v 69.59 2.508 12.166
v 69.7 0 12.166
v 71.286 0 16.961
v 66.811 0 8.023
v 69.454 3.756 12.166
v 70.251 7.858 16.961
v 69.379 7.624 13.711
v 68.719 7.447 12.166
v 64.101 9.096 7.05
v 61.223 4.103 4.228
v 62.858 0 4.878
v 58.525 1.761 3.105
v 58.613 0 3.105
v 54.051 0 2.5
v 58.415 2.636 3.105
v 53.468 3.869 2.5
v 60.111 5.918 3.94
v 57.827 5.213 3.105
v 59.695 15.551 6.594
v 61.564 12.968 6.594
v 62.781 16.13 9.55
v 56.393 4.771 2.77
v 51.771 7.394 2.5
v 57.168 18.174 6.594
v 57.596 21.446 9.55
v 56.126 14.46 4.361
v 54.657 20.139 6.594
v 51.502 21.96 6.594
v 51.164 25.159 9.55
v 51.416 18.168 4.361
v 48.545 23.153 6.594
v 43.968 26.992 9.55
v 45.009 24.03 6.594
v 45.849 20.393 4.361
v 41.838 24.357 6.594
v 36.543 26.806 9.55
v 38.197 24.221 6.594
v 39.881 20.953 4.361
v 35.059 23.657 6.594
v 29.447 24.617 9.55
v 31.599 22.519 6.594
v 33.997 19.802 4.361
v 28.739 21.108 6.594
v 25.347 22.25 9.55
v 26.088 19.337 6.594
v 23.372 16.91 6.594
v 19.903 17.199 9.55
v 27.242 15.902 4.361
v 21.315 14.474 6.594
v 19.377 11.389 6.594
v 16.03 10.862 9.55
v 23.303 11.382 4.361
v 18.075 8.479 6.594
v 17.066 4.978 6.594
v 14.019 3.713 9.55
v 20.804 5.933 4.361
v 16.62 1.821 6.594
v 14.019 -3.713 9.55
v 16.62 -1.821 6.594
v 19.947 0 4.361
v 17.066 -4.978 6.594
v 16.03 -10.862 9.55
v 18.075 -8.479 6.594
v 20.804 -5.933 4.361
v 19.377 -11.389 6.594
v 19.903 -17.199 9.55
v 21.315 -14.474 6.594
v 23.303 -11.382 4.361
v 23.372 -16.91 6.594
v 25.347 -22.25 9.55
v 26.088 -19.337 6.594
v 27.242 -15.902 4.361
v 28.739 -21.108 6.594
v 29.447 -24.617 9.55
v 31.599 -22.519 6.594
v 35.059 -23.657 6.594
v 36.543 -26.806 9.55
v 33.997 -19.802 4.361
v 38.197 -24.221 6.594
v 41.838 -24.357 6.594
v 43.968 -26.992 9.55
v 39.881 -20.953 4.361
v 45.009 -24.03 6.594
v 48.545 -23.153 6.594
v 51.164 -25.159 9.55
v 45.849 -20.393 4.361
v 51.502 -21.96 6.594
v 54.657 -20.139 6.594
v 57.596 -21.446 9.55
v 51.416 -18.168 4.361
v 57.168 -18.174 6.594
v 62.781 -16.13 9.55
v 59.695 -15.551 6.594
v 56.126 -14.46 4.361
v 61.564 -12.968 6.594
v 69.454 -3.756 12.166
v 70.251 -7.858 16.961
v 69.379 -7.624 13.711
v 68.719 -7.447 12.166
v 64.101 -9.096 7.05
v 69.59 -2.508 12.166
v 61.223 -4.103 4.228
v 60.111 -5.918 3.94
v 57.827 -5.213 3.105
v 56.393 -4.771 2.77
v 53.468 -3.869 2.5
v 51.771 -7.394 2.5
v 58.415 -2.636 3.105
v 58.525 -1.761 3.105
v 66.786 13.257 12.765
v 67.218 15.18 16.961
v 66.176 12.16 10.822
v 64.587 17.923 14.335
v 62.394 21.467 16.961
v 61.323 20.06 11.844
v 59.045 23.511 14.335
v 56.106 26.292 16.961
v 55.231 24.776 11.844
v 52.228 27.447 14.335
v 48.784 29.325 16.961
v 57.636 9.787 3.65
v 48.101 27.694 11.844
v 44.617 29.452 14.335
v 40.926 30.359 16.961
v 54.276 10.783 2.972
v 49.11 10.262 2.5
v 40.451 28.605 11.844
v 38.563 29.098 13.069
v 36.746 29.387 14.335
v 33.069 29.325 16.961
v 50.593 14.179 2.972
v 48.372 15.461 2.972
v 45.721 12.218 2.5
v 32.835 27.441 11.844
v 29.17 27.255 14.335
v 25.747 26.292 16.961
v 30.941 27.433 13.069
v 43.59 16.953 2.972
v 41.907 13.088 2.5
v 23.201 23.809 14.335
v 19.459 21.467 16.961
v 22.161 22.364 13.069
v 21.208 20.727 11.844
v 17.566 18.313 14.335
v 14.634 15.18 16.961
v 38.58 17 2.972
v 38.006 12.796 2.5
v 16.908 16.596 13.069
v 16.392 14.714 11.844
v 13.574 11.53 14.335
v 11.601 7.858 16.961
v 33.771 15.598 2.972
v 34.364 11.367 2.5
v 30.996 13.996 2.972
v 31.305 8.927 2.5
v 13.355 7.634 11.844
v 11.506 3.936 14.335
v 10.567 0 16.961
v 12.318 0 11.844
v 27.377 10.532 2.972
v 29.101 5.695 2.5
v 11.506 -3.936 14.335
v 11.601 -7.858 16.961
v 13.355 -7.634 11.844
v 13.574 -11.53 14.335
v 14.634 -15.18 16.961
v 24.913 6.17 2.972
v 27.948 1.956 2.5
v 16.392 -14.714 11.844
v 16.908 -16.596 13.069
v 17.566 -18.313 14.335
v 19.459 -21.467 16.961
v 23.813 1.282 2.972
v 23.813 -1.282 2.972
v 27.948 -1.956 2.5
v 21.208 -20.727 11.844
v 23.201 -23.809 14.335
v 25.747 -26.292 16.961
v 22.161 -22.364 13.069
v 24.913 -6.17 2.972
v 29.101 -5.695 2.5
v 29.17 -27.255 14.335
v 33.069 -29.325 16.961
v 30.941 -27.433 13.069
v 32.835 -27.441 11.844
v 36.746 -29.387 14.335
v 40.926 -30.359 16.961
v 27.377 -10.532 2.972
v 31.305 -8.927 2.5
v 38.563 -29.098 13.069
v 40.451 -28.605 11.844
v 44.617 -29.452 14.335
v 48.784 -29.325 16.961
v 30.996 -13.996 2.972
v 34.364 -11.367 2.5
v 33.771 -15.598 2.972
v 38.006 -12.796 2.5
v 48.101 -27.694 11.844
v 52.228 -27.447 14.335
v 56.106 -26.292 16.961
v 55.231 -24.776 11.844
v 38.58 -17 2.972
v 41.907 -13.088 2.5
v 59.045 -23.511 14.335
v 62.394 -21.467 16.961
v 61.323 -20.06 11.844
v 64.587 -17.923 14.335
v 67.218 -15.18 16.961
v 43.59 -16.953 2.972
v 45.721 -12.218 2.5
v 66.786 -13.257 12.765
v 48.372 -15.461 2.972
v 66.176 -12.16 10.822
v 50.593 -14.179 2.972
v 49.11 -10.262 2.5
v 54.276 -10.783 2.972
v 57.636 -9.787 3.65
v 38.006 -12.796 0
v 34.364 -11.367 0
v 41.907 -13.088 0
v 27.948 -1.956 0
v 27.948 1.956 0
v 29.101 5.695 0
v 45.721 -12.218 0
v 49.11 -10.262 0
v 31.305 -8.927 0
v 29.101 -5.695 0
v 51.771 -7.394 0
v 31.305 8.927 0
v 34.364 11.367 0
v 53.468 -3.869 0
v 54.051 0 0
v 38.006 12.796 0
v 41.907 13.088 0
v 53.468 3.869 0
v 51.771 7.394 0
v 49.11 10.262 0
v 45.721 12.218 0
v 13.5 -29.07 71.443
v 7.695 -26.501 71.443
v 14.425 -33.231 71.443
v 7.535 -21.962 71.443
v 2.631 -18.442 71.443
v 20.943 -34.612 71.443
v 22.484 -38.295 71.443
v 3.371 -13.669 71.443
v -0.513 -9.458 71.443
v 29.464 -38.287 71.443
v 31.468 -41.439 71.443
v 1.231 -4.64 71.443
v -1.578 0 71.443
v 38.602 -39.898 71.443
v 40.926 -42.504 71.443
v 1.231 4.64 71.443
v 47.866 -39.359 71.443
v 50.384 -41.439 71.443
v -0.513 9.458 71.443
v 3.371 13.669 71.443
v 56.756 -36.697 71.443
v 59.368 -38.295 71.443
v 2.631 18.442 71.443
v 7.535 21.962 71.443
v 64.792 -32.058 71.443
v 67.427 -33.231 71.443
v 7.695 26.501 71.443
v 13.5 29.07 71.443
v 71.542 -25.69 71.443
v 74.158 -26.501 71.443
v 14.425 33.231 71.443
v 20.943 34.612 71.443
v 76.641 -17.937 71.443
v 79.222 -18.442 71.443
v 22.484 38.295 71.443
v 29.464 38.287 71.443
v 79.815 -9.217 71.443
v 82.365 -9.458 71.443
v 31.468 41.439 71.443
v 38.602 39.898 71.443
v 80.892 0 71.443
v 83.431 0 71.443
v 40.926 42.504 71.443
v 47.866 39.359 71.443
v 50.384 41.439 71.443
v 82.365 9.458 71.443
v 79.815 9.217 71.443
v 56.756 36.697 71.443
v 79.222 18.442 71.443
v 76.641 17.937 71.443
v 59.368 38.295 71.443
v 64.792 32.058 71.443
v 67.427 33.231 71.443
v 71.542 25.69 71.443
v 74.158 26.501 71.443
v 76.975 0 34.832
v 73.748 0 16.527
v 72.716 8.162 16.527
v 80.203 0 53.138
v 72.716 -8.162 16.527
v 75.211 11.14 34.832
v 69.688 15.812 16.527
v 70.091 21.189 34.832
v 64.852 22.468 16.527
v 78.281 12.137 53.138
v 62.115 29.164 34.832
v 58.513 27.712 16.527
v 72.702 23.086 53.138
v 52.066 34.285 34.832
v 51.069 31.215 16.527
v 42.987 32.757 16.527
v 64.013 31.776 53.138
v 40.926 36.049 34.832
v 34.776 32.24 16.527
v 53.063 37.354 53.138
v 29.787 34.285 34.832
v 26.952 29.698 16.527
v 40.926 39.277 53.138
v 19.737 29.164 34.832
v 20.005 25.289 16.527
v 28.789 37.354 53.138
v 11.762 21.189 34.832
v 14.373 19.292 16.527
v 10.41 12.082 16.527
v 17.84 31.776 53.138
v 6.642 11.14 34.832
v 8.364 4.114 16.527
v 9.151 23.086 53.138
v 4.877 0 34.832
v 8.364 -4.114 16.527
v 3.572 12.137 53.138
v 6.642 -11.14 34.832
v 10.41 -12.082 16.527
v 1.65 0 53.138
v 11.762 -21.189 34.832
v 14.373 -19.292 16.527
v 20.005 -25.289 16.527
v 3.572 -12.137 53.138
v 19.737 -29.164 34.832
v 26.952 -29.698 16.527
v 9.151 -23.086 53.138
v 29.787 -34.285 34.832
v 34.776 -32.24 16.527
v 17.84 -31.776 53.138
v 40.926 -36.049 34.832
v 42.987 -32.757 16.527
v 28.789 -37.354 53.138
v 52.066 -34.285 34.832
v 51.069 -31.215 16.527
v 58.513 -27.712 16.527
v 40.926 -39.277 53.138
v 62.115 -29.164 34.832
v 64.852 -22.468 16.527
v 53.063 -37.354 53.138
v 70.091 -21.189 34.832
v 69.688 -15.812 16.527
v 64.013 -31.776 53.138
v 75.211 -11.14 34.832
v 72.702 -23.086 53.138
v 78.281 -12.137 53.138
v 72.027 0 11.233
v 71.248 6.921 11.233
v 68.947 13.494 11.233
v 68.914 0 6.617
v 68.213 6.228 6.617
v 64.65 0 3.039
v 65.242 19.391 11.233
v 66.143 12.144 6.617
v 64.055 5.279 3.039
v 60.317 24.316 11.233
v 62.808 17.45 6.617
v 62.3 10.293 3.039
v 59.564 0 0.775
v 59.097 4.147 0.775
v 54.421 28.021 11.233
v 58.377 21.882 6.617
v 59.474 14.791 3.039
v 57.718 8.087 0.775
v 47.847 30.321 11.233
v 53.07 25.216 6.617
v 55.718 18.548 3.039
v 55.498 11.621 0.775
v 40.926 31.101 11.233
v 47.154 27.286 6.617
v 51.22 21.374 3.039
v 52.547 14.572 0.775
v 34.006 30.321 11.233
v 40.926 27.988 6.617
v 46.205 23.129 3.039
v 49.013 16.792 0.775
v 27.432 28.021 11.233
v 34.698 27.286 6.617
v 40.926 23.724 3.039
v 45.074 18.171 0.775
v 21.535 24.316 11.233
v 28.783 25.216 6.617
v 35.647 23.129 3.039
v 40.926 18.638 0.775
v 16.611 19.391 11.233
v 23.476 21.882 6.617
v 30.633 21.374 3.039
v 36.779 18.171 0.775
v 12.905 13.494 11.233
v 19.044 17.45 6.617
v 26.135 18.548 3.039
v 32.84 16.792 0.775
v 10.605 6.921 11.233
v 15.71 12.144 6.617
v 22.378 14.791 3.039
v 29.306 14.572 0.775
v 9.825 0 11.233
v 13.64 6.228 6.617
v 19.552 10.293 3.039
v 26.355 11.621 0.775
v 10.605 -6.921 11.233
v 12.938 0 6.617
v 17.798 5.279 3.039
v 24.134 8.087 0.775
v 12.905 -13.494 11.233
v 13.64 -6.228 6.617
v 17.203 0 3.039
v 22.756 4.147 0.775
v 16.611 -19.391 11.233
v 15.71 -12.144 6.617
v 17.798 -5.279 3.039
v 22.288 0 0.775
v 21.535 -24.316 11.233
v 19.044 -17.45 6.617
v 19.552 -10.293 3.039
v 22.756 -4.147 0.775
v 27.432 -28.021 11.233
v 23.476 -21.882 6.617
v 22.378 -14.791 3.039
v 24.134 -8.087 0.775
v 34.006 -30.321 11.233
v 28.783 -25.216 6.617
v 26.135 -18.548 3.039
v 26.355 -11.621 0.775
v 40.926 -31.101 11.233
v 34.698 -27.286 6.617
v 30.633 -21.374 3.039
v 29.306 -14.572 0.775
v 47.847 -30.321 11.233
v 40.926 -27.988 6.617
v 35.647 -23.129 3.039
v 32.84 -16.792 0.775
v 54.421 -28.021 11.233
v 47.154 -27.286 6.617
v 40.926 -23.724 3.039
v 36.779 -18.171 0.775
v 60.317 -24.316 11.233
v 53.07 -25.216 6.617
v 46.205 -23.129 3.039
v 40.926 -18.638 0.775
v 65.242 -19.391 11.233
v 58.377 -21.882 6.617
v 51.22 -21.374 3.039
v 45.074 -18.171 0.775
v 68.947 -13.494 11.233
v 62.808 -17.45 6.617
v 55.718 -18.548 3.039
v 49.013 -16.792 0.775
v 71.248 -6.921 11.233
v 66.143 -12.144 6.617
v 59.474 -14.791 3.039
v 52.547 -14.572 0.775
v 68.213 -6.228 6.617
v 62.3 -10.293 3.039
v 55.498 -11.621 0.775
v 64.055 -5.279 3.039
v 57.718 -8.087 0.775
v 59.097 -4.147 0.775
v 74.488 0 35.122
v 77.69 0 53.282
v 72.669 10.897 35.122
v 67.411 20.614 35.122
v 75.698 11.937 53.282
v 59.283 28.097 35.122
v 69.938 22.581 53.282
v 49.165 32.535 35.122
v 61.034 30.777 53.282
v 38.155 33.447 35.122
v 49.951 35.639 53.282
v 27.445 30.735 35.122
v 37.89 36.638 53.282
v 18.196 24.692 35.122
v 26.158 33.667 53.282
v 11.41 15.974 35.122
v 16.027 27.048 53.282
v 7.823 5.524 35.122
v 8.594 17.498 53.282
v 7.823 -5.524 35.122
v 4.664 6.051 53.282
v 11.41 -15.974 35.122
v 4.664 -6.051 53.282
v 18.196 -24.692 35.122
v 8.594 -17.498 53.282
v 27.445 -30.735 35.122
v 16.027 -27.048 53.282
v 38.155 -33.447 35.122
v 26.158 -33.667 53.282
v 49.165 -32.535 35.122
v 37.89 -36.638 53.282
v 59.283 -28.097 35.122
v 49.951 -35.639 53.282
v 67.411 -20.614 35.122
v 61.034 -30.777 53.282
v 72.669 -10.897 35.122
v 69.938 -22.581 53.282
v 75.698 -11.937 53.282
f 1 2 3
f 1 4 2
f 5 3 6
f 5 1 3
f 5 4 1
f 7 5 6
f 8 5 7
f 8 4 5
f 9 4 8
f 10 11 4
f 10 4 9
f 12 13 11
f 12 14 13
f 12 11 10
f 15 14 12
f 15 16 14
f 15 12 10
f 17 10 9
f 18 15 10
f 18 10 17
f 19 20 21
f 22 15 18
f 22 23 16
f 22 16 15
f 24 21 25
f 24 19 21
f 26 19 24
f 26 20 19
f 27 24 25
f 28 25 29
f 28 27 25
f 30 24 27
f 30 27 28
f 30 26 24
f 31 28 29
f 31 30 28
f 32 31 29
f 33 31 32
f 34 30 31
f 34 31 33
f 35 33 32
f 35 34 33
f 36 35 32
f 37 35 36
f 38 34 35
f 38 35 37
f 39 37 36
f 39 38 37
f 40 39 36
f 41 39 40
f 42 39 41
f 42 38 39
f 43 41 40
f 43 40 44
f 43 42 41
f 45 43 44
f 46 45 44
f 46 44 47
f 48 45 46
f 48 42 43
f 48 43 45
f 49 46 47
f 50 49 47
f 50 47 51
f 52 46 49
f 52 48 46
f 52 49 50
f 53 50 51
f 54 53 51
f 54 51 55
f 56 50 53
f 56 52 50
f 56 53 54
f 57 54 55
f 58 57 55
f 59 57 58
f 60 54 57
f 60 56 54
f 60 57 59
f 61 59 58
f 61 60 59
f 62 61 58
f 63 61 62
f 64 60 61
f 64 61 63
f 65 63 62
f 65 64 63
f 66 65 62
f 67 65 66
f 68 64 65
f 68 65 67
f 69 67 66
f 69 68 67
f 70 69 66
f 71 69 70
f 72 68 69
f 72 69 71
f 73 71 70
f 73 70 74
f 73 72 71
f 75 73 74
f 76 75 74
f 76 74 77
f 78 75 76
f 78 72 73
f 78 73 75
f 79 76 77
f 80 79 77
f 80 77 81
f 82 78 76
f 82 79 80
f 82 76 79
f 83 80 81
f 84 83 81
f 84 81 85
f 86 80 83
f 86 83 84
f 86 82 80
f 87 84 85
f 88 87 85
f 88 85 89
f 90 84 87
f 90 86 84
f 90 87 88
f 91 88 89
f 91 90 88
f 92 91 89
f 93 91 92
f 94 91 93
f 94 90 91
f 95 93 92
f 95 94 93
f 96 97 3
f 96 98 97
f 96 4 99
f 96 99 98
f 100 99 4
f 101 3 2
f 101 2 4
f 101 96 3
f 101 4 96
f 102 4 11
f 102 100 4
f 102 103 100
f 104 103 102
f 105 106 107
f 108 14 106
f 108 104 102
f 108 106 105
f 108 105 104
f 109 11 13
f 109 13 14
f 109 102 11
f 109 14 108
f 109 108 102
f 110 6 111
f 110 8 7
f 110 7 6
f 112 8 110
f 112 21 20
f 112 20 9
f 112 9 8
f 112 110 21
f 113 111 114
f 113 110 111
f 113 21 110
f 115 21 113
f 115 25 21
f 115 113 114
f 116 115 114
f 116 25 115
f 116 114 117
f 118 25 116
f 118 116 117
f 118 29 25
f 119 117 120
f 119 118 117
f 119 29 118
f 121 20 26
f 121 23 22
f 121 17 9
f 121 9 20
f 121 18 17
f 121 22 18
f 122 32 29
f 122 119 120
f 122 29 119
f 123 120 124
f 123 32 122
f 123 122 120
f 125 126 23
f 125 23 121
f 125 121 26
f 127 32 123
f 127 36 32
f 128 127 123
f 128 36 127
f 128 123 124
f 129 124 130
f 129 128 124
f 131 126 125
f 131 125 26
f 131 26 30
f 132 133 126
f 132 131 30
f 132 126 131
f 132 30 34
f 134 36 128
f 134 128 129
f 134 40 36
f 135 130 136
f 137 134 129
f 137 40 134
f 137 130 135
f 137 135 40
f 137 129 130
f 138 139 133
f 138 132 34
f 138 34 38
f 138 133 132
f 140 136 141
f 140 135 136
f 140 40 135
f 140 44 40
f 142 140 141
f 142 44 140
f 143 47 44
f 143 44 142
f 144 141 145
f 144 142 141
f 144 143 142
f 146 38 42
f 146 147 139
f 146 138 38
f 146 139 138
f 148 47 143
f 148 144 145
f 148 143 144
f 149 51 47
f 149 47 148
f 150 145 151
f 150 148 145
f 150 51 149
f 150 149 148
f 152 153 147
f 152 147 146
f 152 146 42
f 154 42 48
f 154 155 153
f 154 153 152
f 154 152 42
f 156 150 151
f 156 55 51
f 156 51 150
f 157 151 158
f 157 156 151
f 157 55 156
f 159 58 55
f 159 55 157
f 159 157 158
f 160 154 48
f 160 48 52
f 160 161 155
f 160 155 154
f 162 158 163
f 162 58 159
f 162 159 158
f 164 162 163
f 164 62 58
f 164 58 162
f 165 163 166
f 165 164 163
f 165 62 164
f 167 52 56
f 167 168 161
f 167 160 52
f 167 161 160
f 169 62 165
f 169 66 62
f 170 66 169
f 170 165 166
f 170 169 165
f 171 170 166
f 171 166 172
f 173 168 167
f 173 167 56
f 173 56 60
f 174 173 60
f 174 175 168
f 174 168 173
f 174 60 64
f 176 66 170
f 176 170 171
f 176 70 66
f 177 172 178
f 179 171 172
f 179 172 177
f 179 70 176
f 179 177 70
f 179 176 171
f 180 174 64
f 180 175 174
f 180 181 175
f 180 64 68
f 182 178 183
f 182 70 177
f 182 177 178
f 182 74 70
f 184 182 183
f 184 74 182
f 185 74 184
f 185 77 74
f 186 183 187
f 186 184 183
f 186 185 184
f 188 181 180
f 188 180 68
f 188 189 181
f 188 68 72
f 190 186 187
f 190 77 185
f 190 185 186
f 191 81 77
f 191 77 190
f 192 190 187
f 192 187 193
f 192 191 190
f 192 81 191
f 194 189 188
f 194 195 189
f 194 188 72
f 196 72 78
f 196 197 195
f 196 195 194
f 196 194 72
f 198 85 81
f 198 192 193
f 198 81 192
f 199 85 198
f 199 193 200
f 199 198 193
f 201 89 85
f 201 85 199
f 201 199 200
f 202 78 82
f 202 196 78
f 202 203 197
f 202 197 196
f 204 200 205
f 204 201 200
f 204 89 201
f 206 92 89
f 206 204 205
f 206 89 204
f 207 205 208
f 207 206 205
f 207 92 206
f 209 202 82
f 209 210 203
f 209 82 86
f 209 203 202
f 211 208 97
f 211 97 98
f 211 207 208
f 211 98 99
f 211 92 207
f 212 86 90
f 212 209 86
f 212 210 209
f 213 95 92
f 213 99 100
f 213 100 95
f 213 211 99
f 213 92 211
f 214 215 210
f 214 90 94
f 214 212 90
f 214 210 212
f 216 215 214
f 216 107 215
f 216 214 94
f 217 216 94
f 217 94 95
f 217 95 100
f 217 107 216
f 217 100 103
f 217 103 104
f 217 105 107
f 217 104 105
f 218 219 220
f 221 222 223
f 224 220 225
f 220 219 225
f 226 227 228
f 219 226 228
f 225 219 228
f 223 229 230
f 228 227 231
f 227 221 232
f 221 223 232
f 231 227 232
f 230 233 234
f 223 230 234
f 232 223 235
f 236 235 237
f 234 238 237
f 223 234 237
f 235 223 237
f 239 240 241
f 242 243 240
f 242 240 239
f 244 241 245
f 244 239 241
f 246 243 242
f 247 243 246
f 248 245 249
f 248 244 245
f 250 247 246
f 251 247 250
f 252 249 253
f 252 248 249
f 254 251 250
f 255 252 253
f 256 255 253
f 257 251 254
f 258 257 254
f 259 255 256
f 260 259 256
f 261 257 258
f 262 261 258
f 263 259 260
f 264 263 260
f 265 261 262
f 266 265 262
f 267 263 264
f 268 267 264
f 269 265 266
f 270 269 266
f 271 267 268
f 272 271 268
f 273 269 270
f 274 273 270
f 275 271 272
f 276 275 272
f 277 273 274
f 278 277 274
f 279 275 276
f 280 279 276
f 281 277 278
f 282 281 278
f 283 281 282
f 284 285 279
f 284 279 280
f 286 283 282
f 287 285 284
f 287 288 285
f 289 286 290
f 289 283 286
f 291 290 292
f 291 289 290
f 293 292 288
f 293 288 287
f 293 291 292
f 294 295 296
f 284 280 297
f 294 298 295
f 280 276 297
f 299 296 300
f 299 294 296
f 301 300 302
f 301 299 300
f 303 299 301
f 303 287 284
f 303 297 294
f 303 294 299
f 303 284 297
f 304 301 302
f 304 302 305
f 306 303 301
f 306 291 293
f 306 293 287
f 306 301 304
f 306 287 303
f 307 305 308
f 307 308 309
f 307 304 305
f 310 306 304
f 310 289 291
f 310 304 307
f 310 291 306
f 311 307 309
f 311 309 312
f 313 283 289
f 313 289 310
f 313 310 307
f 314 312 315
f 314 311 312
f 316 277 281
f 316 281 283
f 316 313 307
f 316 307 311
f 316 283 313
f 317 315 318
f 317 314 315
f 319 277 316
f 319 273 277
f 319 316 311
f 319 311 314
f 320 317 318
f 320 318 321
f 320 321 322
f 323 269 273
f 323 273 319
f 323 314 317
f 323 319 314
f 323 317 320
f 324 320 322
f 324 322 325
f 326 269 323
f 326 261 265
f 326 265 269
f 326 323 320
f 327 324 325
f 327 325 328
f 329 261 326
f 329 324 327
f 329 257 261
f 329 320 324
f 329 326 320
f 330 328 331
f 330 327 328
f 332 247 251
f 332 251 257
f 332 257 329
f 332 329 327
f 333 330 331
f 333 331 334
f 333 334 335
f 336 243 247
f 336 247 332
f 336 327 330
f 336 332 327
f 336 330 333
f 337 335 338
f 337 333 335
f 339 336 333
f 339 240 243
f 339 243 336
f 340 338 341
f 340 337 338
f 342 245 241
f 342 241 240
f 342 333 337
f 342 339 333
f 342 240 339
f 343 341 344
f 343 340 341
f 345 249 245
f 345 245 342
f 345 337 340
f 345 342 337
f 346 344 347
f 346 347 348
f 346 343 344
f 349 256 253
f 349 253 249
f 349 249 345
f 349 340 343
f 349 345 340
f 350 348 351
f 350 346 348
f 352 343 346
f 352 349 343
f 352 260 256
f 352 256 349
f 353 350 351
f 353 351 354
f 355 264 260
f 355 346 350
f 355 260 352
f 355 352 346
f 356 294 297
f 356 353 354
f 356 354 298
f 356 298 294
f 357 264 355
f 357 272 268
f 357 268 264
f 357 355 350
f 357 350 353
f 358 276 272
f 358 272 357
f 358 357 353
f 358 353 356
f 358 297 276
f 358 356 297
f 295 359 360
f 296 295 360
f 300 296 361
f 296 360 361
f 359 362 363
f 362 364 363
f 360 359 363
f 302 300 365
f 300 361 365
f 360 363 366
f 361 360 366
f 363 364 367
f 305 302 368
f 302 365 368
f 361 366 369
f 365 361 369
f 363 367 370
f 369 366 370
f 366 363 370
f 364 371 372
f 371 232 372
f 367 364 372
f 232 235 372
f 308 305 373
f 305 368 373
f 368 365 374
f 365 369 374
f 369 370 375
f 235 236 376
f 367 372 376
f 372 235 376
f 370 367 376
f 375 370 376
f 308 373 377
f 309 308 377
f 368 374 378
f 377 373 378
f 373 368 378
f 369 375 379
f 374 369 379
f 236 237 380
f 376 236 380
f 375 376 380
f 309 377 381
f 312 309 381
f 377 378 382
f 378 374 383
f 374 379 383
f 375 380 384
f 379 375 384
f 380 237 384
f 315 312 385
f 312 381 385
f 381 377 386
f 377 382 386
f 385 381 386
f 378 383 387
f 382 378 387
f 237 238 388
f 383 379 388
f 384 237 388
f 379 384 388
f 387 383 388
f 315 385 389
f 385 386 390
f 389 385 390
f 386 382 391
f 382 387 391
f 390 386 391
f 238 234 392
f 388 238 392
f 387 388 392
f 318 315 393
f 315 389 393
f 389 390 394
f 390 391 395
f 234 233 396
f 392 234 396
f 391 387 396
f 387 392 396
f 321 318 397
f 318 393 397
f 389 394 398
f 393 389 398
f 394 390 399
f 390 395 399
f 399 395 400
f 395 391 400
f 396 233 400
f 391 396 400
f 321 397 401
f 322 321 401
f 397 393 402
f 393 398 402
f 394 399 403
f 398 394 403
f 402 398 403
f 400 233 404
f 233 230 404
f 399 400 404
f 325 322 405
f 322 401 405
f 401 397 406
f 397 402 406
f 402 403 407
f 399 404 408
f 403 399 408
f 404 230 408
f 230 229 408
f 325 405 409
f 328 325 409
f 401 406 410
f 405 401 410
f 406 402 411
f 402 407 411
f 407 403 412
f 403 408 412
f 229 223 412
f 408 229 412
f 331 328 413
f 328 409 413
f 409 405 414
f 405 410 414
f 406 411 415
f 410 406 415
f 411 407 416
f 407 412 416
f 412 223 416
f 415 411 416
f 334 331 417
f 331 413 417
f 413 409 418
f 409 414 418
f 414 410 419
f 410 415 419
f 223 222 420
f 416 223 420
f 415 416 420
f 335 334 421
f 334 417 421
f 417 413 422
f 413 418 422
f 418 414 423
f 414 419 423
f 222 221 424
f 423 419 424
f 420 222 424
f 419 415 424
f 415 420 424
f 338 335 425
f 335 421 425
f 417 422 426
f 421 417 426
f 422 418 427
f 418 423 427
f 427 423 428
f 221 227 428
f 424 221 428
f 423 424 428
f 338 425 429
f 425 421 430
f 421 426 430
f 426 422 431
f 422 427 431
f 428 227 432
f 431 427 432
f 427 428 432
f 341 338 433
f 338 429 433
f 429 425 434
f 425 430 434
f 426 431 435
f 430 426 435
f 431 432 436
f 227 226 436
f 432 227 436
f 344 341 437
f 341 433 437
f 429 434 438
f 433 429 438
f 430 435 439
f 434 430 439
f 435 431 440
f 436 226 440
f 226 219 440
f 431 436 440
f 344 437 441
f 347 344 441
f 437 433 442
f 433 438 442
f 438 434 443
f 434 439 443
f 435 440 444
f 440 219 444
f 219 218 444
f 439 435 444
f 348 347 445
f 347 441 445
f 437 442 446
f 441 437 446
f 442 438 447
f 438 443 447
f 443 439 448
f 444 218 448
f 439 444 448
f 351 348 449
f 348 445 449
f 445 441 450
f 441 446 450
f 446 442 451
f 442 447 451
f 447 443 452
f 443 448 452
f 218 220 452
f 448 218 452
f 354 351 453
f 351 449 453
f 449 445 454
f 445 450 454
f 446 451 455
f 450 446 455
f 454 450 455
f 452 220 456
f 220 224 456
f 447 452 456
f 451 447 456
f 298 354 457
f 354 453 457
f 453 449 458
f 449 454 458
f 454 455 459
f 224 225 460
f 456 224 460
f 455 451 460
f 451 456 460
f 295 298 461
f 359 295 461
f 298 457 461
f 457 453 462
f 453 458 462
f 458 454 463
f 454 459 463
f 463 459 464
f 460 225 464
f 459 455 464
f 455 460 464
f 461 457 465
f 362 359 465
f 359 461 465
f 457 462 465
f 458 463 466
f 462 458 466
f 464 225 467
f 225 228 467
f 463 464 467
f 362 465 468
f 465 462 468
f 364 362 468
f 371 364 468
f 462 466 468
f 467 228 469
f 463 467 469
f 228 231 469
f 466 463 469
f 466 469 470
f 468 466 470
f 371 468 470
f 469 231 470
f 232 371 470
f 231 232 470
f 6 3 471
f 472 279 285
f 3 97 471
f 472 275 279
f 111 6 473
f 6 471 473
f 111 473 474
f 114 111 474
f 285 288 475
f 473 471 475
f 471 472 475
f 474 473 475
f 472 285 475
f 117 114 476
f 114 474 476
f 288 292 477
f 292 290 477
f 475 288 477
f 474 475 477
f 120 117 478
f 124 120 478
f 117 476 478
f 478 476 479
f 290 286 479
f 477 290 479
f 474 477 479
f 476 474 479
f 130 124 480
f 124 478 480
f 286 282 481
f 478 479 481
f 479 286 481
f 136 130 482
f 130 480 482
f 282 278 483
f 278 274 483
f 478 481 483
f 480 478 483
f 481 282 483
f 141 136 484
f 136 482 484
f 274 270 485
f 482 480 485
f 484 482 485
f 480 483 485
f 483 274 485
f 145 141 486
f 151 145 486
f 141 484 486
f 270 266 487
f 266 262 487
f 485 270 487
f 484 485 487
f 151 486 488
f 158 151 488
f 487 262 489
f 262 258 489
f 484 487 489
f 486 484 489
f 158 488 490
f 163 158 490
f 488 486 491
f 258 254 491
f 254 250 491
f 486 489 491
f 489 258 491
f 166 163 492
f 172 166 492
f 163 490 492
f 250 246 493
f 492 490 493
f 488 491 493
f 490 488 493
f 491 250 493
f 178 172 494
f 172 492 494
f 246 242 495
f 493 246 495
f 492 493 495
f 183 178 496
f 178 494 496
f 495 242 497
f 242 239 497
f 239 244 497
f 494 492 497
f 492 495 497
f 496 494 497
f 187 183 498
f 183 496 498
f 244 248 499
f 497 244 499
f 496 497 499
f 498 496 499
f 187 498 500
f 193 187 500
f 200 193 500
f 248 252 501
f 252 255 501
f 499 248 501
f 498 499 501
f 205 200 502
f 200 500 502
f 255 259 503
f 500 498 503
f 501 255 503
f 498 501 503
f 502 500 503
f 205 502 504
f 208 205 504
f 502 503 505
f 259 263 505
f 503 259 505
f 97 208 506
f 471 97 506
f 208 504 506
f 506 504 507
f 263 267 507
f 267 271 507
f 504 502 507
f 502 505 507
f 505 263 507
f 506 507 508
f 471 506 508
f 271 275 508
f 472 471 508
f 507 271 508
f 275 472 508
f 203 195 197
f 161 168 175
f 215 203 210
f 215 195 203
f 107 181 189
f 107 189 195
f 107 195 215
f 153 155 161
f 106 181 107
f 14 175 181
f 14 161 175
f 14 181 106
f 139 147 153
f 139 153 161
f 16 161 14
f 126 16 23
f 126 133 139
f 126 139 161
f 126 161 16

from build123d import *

# Parameters (mm, degrees)
F0_R     = 29.9071652846
F1_DEPTH = 71.4429914951
F1_TAPER = -10
F2_R     = 20
F3_T     = -2.5


with BuildPart() as f1:
    # F0 (on Top) → F1 (new body)
    with BuildSketch(Plane.XY):
        with Locations((40.9262999892, 0)):
            Circle(F0_R)
    extrude(amount=F1_DEPTH, taper=F1_TAPER)

    # F2
    f2_edges = [f1.edges().sort_by_distance(p)[0] for p in [
        (11.019135, 0, 0),
    ]]
    fillet(f2_edges, radius=F2_R)

    # F3
    f3_openings = [f1.faces().sort_by_distance(p)[0] for p in [
        (40.9263, 0, 71.442991),
    ]]
    offset(amount=F3_T, openings=f3_openings, kind=Kind.INTERSECTION)


solid = f1.part
